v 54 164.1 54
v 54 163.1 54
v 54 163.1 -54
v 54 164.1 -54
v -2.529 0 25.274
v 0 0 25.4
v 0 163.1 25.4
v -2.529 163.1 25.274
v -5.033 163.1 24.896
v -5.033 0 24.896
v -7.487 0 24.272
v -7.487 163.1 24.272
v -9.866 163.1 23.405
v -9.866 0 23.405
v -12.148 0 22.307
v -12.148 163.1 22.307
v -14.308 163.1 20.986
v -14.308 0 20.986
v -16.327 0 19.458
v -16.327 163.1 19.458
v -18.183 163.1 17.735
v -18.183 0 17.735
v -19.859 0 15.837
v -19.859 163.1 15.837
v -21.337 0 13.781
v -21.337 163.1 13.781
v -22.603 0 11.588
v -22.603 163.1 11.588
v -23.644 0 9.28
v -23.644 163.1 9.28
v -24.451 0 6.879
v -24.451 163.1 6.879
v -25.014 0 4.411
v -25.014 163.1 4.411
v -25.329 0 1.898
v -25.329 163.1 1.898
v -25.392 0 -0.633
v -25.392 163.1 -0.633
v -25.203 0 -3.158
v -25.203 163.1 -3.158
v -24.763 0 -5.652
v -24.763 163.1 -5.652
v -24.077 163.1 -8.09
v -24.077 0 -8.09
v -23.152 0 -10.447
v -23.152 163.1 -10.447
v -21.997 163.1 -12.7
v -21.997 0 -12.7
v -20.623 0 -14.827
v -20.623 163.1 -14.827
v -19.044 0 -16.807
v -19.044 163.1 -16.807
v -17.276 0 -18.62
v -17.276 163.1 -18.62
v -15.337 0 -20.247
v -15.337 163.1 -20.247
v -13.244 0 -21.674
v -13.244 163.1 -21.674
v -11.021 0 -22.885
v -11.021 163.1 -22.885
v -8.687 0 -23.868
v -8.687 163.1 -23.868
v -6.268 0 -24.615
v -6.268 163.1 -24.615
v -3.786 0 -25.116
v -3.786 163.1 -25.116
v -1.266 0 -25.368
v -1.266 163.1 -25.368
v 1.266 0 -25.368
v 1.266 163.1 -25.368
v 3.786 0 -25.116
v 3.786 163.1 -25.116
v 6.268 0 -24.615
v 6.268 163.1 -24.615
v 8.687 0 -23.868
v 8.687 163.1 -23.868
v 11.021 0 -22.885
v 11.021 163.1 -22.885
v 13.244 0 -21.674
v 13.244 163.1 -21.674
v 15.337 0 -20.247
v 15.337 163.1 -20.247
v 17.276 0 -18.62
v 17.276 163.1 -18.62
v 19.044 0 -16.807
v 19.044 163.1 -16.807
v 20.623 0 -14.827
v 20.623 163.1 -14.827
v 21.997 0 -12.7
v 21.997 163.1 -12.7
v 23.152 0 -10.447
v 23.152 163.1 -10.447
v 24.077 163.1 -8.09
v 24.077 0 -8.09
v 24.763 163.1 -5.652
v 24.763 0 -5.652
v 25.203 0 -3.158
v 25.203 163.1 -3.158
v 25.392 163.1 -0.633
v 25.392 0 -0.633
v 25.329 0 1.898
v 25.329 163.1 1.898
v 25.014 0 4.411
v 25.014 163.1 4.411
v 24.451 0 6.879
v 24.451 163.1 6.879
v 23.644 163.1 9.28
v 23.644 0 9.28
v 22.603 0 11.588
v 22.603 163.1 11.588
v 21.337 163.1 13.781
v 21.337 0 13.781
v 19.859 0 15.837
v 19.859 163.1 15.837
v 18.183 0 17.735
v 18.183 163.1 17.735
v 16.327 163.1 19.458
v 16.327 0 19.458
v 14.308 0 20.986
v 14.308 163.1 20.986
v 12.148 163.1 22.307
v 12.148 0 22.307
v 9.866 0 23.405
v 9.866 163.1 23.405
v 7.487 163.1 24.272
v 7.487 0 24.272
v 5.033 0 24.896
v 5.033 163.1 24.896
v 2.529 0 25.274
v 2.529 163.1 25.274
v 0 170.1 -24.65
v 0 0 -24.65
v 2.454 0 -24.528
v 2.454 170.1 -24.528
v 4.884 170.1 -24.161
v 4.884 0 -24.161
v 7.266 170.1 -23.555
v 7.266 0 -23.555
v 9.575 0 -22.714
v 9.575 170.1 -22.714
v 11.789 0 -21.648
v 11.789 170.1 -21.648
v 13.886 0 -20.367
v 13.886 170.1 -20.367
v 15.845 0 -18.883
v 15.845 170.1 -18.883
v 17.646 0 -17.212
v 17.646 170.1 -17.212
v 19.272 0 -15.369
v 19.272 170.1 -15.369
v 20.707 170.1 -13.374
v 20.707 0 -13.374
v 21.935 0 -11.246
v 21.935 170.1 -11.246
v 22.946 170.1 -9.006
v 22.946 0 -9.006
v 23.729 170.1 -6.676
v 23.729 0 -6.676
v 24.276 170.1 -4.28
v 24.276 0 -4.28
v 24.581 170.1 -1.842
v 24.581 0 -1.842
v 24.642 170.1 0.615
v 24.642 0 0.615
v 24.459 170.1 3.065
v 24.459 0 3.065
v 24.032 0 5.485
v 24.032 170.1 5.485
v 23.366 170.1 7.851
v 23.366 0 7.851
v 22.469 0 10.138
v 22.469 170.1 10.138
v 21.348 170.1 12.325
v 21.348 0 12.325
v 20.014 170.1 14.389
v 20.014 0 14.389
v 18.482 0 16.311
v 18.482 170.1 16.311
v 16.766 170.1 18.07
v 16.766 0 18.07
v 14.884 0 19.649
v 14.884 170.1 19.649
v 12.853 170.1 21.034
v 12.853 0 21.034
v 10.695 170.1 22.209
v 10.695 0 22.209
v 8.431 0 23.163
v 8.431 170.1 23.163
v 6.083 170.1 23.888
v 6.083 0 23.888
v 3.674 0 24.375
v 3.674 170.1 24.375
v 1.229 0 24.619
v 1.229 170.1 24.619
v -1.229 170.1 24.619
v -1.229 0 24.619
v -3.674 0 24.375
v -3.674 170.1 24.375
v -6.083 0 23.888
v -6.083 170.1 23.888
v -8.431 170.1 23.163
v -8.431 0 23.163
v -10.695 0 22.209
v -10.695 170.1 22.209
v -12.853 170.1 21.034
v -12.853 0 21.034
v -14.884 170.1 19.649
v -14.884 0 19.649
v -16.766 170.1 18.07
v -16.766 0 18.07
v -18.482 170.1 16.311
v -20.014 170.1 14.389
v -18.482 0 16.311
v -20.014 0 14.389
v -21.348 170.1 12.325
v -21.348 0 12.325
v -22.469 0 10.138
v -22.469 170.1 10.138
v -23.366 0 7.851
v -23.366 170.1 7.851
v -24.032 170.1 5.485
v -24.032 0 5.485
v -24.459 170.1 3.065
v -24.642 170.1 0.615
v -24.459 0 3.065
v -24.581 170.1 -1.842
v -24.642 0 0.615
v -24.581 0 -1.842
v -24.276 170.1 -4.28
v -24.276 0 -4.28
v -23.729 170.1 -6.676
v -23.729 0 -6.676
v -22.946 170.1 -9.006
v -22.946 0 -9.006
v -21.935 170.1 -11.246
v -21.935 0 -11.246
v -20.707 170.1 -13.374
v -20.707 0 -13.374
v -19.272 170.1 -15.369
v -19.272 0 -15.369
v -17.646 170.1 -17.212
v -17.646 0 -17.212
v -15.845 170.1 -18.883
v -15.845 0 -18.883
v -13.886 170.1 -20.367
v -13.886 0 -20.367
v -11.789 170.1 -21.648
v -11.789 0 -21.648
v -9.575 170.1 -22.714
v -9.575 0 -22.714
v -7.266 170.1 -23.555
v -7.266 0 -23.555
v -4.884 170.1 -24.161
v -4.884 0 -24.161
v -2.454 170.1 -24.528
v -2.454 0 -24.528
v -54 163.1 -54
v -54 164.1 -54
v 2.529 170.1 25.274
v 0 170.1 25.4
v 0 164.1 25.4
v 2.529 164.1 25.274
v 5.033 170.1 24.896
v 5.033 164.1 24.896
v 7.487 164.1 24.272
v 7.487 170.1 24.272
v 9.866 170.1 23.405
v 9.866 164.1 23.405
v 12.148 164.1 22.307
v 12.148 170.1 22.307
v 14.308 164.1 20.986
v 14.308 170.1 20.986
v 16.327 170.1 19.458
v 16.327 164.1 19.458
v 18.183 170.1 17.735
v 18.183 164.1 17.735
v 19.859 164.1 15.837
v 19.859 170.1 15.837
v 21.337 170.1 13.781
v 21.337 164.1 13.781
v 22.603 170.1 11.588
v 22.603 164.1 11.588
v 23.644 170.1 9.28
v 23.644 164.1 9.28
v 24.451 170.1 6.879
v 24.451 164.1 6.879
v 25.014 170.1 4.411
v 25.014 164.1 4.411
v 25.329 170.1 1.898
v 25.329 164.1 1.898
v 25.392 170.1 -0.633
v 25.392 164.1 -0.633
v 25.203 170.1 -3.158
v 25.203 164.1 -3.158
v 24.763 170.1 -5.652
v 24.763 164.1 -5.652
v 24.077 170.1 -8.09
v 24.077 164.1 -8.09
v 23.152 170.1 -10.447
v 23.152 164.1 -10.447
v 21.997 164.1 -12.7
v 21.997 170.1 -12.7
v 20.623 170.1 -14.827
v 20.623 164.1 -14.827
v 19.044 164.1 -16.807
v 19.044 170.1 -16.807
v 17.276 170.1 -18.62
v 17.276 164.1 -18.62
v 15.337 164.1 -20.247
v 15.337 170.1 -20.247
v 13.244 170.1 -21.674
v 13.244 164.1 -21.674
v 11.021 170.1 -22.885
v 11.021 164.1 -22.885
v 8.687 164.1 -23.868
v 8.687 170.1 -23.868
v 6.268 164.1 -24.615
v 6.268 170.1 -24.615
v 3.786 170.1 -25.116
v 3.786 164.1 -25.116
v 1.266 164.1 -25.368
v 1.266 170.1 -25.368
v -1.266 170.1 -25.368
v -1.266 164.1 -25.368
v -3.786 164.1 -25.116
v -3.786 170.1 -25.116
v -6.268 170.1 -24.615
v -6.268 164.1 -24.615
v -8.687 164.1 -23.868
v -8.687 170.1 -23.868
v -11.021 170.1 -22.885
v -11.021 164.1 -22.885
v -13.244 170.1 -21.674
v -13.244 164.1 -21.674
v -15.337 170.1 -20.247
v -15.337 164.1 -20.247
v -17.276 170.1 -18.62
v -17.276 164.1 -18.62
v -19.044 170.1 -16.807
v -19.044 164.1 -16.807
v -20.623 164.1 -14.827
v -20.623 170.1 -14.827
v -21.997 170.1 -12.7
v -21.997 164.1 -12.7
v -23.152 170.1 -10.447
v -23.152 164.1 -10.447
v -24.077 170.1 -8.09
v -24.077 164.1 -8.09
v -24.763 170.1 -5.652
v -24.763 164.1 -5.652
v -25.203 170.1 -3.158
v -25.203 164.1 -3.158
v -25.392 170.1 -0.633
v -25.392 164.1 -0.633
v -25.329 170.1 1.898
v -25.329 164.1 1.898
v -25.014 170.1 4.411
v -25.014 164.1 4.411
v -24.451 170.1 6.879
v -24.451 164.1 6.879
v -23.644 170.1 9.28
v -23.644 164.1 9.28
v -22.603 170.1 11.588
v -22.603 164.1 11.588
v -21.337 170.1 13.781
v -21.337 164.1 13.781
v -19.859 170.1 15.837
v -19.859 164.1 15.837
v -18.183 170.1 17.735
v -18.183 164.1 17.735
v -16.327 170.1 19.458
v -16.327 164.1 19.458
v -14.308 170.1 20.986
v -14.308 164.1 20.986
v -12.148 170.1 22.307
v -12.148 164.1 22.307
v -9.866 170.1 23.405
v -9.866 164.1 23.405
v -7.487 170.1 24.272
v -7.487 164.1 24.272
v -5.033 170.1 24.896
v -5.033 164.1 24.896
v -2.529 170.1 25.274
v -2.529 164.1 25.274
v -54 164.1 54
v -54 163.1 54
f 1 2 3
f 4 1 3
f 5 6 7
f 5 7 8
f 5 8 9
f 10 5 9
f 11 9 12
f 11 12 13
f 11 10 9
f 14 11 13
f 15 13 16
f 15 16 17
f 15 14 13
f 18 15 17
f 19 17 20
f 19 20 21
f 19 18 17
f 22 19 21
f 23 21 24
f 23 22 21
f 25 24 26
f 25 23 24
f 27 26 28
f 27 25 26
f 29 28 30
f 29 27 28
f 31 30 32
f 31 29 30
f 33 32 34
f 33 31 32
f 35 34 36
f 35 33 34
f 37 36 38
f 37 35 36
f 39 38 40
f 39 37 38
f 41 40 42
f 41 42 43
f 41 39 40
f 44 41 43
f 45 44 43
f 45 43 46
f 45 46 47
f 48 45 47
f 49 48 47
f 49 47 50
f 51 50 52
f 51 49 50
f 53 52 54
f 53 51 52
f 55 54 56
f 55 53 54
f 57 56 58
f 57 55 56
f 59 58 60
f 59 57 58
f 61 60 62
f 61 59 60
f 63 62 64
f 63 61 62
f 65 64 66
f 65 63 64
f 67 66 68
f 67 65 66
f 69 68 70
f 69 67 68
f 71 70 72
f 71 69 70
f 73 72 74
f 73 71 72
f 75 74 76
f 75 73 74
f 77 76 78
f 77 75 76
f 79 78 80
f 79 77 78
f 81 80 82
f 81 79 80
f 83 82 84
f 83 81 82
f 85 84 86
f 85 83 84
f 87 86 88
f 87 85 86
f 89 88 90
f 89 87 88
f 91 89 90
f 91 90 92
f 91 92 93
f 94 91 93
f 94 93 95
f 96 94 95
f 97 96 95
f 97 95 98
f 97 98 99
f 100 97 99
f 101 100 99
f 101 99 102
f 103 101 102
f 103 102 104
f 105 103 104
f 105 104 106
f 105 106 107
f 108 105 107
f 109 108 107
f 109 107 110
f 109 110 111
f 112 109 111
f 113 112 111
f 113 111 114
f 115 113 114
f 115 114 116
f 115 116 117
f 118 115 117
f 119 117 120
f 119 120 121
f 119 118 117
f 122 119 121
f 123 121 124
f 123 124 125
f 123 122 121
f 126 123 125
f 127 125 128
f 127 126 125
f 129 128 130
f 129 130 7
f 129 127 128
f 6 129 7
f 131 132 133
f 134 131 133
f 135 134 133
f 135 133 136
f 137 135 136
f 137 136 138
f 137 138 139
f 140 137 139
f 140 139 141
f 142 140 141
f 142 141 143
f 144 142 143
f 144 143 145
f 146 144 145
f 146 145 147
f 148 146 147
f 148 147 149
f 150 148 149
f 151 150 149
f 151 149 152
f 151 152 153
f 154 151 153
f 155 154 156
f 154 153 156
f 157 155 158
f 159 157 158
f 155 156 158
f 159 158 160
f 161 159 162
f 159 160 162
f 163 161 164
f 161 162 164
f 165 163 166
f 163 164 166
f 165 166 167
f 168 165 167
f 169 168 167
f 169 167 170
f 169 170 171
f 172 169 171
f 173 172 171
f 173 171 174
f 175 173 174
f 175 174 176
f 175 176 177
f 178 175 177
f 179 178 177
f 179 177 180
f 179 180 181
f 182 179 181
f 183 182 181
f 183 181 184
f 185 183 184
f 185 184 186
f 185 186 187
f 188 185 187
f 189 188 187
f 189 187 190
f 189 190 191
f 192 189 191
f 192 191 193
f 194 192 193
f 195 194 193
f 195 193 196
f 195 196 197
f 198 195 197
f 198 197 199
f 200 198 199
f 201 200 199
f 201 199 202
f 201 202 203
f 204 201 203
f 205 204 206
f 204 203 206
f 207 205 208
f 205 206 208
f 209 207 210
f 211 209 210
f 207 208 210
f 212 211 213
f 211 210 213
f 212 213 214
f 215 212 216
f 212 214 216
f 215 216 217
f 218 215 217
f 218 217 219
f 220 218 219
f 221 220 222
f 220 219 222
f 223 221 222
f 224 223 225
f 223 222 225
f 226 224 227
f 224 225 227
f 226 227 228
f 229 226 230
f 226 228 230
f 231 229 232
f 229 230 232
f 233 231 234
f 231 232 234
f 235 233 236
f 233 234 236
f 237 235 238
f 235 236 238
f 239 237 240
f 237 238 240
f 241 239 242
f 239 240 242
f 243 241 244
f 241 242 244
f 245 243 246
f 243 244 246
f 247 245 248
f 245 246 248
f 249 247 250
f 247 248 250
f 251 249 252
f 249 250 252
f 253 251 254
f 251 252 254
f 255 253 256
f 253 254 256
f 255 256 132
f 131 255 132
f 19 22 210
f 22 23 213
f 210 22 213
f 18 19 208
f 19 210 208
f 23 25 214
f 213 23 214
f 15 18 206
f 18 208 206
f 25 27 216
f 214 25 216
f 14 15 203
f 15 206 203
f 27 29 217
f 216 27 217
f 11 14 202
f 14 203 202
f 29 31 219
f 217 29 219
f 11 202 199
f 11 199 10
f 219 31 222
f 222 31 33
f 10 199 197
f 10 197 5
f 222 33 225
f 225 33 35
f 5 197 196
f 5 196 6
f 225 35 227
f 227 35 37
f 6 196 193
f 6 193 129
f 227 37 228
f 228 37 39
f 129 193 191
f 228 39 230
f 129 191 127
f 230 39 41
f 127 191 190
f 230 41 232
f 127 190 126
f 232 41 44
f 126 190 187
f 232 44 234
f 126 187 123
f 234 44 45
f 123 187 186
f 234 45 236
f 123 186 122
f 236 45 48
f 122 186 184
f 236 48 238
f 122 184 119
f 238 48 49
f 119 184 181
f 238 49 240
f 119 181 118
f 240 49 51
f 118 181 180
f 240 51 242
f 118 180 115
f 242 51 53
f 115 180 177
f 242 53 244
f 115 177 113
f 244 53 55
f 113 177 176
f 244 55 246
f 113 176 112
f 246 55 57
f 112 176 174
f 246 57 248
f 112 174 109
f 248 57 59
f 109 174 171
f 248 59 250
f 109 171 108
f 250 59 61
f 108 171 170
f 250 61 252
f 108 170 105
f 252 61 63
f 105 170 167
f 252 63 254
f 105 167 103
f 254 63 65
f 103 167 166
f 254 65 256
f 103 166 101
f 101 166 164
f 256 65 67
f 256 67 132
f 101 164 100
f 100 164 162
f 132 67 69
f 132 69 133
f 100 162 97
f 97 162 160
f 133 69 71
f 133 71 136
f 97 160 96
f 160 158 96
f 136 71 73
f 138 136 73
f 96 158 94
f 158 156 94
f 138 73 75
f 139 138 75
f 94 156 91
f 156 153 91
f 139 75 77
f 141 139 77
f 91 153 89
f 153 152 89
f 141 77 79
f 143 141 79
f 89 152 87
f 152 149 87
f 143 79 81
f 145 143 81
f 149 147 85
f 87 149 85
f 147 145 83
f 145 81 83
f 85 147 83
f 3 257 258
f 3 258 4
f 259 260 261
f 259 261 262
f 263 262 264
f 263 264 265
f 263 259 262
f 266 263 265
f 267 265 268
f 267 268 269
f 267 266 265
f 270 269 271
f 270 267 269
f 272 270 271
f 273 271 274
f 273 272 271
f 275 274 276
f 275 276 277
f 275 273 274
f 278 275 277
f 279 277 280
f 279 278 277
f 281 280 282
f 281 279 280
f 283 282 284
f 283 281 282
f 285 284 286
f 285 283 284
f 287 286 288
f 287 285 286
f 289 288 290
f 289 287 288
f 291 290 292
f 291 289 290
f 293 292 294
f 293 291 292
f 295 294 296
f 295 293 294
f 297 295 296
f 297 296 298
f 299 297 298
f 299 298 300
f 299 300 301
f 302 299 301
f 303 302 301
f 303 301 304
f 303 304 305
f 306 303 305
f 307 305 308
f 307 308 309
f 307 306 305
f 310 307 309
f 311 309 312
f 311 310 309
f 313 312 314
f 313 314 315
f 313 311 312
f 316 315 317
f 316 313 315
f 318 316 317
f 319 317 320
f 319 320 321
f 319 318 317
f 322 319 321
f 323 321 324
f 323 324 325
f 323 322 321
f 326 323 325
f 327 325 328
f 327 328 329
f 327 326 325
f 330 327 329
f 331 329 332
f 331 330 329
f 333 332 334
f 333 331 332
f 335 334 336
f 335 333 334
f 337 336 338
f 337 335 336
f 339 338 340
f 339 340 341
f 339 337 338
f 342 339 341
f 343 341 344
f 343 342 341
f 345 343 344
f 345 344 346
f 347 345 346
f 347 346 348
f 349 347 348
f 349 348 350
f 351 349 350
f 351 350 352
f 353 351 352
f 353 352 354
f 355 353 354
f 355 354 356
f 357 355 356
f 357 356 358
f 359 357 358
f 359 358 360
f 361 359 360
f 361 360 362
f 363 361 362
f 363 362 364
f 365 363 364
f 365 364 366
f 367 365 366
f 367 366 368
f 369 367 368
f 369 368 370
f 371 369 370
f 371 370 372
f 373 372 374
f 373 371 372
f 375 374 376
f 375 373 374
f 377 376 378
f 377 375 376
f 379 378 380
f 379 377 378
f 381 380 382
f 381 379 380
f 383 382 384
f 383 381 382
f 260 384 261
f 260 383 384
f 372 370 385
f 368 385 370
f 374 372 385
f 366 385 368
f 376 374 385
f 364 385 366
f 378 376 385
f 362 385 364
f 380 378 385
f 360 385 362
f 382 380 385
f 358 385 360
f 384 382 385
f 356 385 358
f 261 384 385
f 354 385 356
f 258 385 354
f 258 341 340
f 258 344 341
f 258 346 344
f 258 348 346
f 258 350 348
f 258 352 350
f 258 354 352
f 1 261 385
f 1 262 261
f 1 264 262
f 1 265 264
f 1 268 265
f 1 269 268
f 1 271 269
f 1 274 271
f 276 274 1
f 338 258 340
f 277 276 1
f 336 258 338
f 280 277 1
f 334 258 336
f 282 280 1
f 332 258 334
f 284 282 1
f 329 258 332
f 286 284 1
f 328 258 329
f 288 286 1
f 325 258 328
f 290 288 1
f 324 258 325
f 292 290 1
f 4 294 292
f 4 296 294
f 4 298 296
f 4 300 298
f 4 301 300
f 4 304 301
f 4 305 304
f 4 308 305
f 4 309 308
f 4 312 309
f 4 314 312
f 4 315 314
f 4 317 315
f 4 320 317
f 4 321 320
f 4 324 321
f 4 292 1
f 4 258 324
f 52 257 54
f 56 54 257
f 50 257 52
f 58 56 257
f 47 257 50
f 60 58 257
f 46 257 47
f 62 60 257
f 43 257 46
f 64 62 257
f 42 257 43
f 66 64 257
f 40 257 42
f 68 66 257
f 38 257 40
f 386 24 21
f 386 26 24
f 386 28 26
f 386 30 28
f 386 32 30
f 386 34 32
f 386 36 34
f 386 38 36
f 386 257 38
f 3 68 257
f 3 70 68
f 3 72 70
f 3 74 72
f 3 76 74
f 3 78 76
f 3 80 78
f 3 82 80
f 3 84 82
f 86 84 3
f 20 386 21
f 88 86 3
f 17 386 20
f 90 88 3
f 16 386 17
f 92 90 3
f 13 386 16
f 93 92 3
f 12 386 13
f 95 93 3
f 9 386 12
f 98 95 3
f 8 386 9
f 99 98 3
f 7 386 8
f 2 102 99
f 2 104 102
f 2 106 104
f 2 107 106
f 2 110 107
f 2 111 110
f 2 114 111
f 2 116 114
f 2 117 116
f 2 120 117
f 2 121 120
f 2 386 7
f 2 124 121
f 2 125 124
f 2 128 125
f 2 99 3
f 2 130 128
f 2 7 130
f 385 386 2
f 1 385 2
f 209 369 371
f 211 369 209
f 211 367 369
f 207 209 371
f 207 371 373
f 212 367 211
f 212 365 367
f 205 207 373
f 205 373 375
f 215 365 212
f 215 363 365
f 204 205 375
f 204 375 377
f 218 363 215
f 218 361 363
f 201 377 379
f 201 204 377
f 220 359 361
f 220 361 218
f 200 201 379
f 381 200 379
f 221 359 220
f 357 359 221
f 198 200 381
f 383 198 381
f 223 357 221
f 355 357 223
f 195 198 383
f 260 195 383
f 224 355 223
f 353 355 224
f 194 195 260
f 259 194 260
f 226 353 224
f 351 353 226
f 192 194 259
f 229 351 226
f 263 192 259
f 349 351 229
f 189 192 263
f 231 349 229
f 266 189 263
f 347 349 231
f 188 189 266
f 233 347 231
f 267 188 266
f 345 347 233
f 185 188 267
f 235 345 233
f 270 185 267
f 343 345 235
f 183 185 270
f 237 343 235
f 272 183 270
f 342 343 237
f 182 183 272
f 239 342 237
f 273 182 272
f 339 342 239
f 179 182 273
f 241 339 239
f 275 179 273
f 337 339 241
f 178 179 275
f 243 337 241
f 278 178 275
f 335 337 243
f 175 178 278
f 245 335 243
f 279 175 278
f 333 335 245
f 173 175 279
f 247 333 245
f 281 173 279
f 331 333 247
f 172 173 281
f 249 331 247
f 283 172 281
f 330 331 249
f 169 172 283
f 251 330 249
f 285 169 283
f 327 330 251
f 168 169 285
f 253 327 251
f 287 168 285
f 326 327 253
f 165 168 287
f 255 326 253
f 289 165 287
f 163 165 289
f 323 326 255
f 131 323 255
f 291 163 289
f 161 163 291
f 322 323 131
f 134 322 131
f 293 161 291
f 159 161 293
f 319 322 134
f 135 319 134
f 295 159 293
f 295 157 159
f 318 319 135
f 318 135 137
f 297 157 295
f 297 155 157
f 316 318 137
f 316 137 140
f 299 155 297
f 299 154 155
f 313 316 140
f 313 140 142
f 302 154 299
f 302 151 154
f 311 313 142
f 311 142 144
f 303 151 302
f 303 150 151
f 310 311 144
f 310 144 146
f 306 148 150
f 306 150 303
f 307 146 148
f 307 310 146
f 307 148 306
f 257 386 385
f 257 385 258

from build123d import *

# Parameters (mm, degrees)
SKETCH1_W           = 108
SKETCH1_H           = 108
BOSS_EXTRUDE1_DEPTH = 170.1
SKETCH2_OUTSIDE_W   = 155.722
SKETCH2_OUTSIDE_H   = 155.722
SKETCH2_OUTSIDE_R   = 25.4
CUT_EXTRUDE1_DEPTH  = 6
SKETCH3_OUTSIDE_W   = 155.722
SKETCH3_OUTSIDE_H   = 155.722
SKETCH3_OUTSIDE_R   = 25.4
CUT_EXTRUDE3_DEPTH  = 163.1
SKETCH5_R           = 24.65
CUT_EXTRUDE4_DEPTH  = 187.456456043


with BuildPart() as part:
    # Sketch1 → Boss-Extrude1 (new body)
    with BuildSketch(Plane(origin=(0, 0, 0), x_dir=(1, 0, 0), z_dir=(0, 1, 0))):
        Rectangle(SKETCH1_W, SKETCH1_H)
    extrude(amount=BOSS_EXTRUDE1_DEPTH)

    # Sketch2 outside → Cut-Extrude1 (cut)
    with BuildSketch(Plane(origin=(0, 170.1, 0), x_dir=(1, 0, 0), z_dir=(0, 1, 0))):
        Rectangle(SKETCH2_OUTSIDE_W, SKETCH2_OUTSIDE_H)
        with Locations(Location((0, 0, 0), (0, 0, 270))):
            Circle(SKETCH2_OUTSIDE_R, mode=Mode.SUBTRACT)
    extrude(amount=-CUT_EXTRUDE1_DEPTH, mode=Mode.SUBTRACT)

    # Sketch3 outside → Cut-Extrude3 (cut)
    with BuildSketch(Plane.XZ):
        Rectangle(SKETCH3_OUTSIDE_W, SKETCH3_OUTSIDE_H)
        with Locations(Location((0, 0, 0), (0, 0, 90))):
            Circle(SKETCH3_OUTSIDE_R, mode=Mode.SUBTRACT)
    extrude(amount=-CUT_EXTRUDE3_DEPTH, mode=Mode.SUBTRACT)

    # Sketch5 → Cut-Extrude4 (cut, through all)
    with BuildSketch(Plane.XZ):
        with Locations(Location((0, 0, 0), (0, 0, 270))):
            Circle(SKETCH5_R)
    extrude(amount=-CUT_EXTRUDE4_DEPTH, mode=Mode.SUBTRACT)


solid = part.part
